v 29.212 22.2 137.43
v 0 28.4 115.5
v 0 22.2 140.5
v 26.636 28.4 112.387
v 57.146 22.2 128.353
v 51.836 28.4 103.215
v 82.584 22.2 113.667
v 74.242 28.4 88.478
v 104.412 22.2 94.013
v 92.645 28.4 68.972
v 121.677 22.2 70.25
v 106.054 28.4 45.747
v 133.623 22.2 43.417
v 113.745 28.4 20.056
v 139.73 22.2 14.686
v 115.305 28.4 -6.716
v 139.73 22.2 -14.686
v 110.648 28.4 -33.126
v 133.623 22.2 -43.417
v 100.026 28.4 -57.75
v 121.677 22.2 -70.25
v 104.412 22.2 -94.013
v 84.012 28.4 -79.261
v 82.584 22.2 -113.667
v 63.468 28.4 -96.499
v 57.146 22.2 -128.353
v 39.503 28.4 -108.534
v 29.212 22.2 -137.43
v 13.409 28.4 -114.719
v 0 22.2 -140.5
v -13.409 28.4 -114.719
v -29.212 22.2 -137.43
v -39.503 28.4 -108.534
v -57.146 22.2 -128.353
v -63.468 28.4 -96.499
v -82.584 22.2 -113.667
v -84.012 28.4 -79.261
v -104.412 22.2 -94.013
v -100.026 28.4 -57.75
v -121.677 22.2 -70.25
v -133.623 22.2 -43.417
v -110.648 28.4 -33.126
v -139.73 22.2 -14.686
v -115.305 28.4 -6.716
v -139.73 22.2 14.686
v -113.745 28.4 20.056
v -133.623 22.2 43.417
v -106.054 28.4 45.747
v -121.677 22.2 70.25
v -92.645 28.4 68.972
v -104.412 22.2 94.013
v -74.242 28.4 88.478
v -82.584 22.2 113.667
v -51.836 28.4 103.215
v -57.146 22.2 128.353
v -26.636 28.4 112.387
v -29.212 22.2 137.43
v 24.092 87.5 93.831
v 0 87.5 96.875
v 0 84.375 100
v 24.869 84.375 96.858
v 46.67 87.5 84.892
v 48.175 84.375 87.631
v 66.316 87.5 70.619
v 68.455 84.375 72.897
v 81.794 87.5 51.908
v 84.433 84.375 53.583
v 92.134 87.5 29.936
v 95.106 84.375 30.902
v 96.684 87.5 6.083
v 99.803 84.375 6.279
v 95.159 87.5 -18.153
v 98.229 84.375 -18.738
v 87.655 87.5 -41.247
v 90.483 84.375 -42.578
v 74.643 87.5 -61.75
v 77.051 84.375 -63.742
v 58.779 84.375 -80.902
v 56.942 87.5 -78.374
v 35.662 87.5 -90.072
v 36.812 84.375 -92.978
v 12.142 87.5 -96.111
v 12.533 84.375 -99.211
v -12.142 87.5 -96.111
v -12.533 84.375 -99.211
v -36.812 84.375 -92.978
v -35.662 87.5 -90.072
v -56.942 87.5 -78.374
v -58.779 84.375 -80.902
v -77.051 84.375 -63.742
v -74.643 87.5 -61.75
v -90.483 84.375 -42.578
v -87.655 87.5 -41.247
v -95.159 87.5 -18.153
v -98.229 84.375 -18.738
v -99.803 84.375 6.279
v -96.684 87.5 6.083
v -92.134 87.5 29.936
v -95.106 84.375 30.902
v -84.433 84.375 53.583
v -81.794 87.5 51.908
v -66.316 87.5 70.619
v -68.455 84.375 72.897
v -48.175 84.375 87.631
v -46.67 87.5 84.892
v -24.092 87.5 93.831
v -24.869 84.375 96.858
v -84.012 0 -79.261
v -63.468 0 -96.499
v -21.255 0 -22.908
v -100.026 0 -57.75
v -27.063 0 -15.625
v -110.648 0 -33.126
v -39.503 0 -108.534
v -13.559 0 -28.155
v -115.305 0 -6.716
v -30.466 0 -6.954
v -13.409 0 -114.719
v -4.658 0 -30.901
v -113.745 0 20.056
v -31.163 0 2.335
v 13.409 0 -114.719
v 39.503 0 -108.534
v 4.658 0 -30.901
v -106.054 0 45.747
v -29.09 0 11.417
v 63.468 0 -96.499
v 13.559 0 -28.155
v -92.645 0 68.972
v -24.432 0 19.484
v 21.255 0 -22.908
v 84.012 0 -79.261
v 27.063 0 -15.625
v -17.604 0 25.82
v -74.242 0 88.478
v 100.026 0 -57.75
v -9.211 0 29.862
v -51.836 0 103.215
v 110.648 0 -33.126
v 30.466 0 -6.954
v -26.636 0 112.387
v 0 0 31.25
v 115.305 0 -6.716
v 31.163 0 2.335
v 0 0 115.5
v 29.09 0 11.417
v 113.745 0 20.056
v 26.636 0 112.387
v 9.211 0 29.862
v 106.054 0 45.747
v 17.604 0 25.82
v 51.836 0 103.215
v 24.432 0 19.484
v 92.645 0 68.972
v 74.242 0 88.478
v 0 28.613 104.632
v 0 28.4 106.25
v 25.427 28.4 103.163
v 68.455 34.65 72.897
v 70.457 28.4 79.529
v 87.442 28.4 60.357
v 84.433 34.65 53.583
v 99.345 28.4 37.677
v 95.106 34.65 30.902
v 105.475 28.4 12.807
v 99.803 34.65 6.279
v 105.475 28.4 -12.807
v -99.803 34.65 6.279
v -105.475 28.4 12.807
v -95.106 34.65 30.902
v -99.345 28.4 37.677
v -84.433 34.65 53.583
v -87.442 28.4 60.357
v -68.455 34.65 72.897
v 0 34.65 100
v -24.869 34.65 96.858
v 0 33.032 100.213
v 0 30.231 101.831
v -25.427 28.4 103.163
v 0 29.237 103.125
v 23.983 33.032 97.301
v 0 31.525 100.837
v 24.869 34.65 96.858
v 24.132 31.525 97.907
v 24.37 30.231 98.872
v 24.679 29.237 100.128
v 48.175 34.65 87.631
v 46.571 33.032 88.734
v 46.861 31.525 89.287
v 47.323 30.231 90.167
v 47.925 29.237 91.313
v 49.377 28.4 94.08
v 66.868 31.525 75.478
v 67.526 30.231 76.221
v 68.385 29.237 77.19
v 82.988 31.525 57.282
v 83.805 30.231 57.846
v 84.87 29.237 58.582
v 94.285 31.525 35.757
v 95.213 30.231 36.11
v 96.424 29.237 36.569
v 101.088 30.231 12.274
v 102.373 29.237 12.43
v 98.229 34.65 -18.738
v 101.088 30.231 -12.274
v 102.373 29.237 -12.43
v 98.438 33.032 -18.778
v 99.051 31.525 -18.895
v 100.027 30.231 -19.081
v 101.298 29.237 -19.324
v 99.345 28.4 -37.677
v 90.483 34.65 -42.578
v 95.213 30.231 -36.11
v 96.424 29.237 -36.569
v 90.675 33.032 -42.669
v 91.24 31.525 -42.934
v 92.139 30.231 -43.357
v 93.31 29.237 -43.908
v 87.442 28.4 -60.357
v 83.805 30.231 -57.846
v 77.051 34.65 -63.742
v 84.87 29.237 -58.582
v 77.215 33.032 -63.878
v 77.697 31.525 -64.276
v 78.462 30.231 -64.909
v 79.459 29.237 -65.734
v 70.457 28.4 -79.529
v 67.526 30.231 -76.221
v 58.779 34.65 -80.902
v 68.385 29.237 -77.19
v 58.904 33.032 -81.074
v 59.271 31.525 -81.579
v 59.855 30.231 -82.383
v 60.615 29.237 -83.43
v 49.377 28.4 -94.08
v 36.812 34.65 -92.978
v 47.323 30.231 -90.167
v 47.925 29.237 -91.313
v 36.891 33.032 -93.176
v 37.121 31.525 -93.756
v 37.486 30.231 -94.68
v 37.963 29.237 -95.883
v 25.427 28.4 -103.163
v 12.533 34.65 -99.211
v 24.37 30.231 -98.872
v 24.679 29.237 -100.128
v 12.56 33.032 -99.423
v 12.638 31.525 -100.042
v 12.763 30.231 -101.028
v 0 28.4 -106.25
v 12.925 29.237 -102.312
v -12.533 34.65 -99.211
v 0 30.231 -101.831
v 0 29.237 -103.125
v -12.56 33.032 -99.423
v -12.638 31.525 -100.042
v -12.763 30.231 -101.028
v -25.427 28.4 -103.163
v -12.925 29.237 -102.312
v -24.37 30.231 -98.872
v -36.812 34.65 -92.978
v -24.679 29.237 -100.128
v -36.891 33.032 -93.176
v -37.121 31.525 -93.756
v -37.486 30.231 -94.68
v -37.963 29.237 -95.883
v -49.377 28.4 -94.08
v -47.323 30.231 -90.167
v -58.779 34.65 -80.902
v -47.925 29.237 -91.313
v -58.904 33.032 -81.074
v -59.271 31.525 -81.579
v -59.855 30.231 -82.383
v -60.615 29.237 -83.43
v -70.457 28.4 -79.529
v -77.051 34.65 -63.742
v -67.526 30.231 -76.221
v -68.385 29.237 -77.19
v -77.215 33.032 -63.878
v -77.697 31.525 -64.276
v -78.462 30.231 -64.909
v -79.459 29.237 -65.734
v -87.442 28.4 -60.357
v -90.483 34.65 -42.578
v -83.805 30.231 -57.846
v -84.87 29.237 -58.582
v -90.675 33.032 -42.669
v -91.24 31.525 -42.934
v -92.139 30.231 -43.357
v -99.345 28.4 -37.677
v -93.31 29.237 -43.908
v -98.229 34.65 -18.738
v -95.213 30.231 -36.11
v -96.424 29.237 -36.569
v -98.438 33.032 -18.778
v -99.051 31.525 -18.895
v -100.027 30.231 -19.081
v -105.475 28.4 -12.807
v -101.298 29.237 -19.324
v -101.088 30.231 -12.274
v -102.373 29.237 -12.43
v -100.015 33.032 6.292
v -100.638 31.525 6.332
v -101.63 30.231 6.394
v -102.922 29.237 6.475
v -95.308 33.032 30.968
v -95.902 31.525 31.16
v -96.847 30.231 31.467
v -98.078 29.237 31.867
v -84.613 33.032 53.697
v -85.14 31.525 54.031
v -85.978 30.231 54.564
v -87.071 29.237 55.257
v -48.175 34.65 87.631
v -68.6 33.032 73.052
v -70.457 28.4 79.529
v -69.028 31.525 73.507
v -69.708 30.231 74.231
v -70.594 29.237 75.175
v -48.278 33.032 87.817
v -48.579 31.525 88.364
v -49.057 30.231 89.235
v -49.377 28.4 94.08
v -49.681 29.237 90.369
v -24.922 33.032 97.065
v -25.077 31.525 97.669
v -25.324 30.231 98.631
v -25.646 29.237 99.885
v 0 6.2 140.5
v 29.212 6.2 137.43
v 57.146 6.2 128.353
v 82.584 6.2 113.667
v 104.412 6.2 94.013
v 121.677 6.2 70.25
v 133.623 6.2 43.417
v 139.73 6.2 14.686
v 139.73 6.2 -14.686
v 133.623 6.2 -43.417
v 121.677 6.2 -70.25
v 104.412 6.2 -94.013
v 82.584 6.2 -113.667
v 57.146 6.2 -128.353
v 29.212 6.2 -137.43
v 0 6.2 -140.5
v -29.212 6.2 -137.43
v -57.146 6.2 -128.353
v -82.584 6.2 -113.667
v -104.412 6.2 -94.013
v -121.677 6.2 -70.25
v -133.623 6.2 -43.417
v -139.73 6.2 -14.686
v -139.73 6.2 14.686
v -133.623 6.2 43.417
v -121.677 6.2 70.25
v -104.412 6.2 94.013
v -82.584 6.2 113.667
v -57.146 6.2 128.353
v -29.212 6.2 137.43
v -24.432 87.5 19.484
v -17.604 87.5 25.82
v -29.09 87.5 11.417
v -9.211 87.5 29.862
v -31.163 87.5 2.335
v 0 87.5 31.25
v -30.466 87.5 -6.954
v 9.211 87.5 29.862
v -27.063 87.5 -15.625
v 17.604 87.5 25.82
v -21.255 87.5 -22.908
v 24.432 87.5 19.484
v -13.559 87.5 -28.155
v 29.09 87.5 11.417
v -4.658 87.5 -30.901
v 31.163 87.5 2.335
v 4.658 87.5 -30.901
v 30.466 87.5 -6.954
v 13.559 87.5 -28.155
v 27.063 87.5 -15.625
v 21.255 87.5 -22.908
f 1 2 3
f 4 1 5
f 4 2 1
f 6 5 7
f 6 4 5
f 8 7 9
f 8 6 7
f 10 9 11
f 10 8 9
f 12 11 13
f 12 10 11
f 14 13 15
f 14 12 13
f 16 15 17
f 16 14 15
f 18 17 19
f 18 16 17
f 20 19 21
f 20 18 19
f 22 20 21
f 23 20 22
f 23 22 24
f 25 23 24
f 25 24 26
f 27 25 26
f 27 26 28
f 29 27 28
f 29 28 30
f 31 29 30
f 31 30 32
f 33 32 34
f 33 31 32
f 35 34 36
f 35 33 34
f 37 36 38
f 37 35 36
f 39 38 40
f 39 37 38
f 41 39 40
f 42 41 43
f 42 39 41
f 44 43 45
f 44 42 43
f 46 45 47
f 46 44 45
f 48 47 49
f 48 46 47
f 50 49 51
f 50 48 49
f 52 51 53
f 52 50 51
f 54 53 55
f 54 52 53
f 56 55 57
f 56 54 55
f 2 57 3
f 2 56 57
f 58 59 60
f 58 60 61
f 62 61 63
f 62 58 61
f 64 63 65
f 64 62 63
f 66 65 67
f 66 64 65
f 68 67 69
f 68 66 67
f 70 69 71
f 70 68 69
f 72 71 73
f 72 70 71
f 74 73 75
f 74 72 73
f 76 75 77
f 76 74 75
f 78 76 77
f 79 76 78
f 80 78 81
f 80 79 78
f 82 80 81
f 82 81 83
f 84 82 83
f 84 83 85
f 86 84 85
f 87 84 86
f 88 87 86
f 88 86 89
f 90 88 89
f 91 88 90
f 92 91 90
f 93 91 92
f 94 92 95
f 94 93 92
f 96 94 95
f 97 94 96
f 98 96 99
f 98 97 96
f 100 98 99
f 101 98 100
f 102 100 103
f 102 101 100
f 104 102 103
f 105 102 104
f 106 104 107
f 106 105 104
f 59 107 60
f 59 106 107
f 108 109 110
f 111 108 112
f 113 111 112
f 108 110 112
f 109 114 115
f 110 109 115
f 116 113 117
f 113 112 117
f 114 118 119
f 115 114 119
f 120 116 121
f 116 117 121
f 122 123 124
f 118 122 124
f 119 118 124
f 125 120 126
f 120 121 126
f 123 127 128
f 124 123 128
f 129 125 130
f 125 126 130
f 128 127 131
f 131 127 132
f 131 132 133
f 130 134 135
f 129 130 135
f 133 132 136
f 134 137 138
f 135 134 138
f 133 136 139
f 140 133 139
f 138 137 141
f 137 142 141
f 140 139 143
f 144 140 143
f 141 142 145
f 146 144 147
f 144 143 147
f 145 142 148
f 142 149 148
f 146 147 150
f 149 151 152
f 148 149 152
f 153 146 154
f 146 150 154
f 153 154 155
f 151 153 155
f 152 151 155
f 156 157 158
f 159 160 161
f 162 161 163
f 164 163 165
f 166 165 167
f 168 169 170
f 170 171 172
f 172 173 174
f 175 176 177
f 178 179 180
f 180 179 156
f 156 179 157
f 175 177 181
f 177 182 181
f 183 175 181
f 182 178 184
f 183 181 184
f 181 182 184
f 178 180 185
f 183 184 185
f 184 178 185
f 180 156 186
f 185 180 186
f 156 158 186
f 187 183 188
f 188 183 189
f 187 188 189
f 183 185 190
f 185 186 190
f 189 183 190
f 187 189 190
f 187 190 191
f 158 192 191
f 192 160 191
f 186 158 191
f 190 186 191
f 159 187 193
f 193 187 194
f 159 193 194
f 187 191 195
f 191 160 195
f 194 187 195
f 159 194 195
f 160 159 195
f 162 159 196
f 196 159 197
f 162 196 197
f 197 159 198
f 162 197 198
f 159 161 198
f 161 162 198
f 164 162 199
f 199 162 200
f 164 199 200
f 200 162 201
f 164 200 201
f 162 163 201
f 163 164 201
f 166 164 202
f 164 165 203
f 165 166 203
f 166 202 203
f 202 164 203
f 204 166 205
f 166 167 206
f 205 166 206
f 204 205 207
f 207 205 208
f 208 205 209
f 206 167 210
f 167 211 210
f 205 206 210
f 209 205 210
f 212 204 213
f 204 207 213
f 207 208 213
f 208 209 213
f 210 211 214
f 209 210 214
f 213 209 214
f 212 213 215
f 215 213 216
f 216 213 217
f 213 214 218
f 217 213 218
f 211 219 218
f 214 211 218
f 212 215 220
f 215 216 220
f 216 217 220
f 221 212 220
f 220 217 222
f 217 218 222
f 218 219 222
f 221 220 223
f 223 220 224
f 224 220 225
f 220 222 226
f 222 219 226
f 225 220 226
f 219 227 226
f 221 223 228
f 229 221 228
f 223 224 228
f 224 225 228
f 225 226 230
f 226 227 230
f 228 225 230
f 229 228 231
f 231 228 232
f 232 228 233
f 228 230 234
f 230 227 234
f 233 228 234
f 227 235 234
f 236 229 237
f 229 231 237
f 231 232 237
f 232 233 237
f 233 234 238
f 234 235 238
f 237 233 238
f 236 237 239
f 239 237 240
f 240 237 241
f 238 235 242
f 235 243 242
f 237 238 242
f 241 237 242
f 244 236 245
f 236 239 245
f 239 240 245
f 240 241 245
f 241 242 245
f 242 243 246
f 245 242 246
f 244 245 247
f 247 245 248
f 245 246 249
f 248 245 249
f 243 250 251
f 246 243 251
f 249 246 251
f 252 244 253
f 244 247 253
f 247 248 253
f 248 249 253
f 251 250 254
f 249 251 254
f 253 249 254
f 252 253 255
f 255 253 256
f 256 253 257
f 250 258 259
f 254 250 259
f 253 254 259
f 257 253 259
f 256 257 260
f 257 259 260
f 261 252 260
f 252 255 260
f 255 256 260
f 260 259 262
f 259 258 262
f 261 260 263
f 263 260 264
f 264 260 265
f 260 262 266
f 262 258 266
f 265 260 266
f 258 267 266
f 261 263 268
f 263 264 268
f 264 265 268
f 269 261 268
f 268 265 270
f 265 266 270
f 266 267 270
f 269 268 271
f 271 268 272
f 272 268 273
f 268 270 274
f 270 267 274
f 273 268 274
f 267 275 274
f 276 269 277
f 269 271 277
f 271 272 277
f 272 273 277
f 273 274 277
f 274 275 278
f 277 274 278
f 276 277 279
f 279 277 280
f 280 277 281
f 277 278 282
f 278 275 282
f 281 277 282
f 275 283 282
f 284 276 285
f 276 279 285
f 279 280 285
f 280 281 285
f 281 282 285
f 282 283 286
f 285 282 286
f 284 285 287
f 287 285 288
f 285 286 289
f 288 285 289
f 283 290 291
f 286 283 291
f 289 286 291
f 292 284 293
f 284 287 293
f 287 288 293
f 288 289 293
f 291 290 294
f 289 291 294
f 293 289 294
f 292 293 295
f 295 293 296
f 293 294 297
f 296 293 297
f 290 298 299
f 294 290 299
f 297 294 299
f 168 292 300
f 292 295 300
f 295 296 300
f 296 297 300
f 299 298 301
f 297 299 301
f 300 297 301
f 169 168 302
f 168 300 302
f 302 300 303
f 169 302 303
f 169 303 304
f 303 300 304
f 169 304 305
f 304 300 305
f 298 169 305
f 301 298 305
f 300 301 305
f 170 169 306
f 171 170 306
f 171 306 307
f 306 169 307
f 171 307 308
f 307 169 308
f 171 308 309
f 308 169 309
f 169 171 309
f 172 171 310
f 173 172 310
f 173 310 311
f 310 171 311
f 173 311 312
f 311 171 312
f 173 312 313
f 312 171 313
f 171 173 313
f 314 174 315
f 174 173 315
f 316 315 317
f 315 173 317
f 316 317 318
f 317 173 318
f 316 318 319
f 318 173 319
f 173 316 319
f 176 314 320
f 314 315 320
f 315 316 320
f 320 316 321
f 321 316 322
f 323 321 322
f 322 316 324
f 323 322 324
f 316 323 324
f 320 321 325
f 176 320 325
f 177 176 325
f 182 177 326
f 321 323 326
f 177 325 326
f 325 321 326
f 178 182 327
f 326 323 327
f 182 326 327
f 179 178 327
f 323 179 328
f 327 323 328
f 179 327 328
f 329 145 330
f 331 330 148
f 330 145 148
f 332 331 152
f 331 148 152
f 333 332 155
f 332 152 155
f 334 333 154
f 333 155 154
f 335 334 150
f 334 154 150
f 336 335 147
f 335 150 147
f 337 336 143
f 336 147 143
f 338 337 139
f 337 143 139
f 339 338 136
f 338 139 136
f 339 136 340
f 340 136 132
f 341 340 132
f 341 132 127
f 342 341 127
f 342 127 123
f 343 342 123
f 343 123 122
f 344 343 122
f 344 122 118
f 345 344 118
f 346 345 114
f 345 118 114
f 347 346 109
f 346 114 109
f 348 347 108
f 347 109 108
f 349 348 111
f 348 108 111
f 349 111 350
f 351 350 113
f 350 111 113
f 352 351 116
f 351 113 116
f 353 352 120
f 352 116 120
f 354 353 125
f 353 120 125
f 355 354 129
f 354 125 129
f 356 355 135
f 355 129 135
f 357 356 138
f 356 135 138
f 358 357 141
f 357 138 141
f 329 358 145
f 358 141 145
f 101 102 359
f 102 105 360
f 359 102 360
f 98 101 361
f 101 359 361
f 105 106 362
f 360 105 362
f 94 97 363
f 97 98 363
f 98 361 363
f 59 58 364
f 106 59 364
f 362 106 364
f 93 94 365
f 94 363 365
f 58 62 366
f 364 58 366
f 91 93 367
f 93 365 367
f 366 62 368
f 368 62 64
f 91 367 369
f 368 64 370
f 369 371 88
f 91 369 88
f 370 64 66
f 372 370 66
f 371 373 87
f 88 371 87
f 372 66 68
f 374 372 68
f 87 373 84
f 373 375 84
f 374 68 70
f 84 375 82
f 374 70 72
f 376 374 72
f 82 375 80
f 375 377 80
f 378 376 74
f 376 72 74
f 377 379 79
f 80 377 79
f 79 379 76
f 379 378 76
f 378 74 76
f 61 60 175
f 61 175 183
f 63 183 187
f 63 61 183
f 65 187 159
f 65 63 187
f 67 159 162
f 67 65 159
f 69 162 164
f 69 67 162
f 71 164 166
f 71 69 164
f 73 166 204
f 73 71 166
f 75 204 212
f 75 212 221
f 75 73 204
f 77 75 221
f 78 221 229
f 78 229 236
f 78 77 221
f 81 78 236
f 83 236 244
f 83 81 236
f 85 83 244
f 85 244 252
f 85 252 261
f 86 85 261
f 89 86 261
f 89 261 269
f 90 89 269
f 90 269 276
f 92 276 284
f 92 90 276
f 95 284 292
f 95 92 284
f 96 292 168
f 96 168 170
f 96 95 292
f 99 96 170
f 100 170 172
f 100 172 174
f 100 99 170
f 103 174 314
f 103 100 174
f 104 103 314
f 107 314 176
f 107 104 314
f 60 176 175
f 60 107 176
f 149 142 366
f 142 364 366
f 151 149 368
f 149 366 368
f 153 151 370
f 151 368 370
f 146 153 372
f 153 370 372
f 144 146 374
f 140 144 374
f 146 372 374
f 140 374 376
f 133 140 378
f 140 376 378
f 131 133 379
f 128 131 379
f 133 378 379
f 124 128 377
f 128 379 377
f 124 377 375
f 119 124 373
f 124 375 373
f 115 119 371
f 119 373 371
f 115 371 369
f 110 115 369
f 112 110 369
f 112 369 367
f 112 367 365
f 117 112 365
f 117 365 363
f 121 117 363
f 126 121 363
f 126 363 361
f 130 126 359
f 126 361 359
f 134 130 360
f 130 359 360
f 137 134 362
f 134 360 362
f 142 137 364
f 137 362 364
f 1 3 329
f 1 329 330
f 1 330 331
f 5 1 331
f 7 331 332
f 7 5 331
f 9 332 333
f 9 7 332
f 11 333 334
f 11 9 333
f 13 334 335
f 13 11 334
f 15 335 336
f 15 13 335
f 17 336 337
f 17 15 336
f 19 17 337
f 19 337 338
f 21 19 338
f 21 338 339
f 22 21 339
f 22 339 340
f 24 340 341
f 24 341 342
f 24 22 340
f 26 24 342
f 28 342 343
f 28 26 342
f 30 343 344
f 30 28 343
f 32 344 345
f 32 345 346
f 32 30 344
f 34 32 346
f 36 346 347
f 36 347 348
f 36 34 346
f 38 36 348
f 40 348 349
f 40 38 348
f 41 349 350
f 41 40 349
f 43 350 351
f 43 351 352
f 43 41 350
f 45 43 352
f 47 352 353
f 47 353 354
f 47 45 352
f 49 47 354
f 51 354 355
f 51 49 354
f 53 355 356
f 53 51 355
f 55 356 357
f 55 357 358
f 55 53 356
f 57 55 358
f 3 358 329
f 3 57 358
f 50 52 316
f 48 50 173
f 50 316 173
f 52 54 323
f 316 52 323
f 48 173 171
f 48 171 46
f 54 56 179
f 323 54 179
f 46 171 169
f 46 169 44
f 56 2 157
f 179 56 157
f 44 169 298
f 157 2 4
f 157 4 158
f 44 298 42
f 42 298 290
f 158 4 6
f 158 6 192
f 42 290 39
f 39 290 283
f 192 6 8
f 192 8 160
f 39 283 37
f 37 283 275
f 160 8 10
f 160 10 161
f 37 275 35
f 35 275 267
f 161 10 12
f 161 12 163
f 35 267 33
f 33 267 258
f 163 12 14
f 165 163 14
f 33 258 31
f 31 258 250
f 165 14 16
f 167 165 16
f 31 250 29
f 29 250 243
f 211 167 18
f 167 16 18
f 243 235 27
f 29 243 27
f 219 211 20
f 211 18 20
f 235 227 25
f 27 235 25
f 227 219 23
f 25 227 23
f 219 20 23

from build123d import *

# Parameters (mm, degrees)
F0_W     = 28.4
F0_H     = 40.5
F0_H_2   = 68.75
F0_W_2   = 59.1
F2_R     = 6.25
F3_SIZE  = 3.125
F4_SIZE2 = 25
F4_SIZE  = 6.2


with BuildPart() as f1:
    # F0 (on Right) → F1 (revolve)
    with BuildSketch(Plane.YZ):
        with Locations((14.2, 120.25)):
            Rectangle(F0_W, F0_H)
        with Locations((14.2, 65.625)):
            Rectangle(F0_W, F0_H_2)
        with Locations((57.95, 65.625)):
            Rectangle(F0_W_2, F0_H_2)
    revolve(axis=Axis((0, 43.75, 0), (0, 1, 0)))

    # F2
    f2_edges = [f1.edges().sort_by_distance(p)[0] for p in [
        (0, 28.4, -100),
    ]]
    fillet(f2_edges, radius=F2_R)

    # F3
    f3_edges = [f1.edges().sort_by_distance(p)[0] for p in [
        (0, 87.5, -100),
    ]]
    chamfer(f3_edges, length=F3_SIZE)

    # F4
    f4_edges = [f1.edges().sort_by_distance(p)[0] for p in [
        (0, 0, -140.5),
        (0, 28.4, -140.5),
    ]]
    f4_side = f1.faces().sort_by_distance((0, 14.2, -140.5))[0]
    chamfer(f4_edges, length=F4_SIZE, length2=F4_SIZE2, reference=f4_side)


solid = f1.part
